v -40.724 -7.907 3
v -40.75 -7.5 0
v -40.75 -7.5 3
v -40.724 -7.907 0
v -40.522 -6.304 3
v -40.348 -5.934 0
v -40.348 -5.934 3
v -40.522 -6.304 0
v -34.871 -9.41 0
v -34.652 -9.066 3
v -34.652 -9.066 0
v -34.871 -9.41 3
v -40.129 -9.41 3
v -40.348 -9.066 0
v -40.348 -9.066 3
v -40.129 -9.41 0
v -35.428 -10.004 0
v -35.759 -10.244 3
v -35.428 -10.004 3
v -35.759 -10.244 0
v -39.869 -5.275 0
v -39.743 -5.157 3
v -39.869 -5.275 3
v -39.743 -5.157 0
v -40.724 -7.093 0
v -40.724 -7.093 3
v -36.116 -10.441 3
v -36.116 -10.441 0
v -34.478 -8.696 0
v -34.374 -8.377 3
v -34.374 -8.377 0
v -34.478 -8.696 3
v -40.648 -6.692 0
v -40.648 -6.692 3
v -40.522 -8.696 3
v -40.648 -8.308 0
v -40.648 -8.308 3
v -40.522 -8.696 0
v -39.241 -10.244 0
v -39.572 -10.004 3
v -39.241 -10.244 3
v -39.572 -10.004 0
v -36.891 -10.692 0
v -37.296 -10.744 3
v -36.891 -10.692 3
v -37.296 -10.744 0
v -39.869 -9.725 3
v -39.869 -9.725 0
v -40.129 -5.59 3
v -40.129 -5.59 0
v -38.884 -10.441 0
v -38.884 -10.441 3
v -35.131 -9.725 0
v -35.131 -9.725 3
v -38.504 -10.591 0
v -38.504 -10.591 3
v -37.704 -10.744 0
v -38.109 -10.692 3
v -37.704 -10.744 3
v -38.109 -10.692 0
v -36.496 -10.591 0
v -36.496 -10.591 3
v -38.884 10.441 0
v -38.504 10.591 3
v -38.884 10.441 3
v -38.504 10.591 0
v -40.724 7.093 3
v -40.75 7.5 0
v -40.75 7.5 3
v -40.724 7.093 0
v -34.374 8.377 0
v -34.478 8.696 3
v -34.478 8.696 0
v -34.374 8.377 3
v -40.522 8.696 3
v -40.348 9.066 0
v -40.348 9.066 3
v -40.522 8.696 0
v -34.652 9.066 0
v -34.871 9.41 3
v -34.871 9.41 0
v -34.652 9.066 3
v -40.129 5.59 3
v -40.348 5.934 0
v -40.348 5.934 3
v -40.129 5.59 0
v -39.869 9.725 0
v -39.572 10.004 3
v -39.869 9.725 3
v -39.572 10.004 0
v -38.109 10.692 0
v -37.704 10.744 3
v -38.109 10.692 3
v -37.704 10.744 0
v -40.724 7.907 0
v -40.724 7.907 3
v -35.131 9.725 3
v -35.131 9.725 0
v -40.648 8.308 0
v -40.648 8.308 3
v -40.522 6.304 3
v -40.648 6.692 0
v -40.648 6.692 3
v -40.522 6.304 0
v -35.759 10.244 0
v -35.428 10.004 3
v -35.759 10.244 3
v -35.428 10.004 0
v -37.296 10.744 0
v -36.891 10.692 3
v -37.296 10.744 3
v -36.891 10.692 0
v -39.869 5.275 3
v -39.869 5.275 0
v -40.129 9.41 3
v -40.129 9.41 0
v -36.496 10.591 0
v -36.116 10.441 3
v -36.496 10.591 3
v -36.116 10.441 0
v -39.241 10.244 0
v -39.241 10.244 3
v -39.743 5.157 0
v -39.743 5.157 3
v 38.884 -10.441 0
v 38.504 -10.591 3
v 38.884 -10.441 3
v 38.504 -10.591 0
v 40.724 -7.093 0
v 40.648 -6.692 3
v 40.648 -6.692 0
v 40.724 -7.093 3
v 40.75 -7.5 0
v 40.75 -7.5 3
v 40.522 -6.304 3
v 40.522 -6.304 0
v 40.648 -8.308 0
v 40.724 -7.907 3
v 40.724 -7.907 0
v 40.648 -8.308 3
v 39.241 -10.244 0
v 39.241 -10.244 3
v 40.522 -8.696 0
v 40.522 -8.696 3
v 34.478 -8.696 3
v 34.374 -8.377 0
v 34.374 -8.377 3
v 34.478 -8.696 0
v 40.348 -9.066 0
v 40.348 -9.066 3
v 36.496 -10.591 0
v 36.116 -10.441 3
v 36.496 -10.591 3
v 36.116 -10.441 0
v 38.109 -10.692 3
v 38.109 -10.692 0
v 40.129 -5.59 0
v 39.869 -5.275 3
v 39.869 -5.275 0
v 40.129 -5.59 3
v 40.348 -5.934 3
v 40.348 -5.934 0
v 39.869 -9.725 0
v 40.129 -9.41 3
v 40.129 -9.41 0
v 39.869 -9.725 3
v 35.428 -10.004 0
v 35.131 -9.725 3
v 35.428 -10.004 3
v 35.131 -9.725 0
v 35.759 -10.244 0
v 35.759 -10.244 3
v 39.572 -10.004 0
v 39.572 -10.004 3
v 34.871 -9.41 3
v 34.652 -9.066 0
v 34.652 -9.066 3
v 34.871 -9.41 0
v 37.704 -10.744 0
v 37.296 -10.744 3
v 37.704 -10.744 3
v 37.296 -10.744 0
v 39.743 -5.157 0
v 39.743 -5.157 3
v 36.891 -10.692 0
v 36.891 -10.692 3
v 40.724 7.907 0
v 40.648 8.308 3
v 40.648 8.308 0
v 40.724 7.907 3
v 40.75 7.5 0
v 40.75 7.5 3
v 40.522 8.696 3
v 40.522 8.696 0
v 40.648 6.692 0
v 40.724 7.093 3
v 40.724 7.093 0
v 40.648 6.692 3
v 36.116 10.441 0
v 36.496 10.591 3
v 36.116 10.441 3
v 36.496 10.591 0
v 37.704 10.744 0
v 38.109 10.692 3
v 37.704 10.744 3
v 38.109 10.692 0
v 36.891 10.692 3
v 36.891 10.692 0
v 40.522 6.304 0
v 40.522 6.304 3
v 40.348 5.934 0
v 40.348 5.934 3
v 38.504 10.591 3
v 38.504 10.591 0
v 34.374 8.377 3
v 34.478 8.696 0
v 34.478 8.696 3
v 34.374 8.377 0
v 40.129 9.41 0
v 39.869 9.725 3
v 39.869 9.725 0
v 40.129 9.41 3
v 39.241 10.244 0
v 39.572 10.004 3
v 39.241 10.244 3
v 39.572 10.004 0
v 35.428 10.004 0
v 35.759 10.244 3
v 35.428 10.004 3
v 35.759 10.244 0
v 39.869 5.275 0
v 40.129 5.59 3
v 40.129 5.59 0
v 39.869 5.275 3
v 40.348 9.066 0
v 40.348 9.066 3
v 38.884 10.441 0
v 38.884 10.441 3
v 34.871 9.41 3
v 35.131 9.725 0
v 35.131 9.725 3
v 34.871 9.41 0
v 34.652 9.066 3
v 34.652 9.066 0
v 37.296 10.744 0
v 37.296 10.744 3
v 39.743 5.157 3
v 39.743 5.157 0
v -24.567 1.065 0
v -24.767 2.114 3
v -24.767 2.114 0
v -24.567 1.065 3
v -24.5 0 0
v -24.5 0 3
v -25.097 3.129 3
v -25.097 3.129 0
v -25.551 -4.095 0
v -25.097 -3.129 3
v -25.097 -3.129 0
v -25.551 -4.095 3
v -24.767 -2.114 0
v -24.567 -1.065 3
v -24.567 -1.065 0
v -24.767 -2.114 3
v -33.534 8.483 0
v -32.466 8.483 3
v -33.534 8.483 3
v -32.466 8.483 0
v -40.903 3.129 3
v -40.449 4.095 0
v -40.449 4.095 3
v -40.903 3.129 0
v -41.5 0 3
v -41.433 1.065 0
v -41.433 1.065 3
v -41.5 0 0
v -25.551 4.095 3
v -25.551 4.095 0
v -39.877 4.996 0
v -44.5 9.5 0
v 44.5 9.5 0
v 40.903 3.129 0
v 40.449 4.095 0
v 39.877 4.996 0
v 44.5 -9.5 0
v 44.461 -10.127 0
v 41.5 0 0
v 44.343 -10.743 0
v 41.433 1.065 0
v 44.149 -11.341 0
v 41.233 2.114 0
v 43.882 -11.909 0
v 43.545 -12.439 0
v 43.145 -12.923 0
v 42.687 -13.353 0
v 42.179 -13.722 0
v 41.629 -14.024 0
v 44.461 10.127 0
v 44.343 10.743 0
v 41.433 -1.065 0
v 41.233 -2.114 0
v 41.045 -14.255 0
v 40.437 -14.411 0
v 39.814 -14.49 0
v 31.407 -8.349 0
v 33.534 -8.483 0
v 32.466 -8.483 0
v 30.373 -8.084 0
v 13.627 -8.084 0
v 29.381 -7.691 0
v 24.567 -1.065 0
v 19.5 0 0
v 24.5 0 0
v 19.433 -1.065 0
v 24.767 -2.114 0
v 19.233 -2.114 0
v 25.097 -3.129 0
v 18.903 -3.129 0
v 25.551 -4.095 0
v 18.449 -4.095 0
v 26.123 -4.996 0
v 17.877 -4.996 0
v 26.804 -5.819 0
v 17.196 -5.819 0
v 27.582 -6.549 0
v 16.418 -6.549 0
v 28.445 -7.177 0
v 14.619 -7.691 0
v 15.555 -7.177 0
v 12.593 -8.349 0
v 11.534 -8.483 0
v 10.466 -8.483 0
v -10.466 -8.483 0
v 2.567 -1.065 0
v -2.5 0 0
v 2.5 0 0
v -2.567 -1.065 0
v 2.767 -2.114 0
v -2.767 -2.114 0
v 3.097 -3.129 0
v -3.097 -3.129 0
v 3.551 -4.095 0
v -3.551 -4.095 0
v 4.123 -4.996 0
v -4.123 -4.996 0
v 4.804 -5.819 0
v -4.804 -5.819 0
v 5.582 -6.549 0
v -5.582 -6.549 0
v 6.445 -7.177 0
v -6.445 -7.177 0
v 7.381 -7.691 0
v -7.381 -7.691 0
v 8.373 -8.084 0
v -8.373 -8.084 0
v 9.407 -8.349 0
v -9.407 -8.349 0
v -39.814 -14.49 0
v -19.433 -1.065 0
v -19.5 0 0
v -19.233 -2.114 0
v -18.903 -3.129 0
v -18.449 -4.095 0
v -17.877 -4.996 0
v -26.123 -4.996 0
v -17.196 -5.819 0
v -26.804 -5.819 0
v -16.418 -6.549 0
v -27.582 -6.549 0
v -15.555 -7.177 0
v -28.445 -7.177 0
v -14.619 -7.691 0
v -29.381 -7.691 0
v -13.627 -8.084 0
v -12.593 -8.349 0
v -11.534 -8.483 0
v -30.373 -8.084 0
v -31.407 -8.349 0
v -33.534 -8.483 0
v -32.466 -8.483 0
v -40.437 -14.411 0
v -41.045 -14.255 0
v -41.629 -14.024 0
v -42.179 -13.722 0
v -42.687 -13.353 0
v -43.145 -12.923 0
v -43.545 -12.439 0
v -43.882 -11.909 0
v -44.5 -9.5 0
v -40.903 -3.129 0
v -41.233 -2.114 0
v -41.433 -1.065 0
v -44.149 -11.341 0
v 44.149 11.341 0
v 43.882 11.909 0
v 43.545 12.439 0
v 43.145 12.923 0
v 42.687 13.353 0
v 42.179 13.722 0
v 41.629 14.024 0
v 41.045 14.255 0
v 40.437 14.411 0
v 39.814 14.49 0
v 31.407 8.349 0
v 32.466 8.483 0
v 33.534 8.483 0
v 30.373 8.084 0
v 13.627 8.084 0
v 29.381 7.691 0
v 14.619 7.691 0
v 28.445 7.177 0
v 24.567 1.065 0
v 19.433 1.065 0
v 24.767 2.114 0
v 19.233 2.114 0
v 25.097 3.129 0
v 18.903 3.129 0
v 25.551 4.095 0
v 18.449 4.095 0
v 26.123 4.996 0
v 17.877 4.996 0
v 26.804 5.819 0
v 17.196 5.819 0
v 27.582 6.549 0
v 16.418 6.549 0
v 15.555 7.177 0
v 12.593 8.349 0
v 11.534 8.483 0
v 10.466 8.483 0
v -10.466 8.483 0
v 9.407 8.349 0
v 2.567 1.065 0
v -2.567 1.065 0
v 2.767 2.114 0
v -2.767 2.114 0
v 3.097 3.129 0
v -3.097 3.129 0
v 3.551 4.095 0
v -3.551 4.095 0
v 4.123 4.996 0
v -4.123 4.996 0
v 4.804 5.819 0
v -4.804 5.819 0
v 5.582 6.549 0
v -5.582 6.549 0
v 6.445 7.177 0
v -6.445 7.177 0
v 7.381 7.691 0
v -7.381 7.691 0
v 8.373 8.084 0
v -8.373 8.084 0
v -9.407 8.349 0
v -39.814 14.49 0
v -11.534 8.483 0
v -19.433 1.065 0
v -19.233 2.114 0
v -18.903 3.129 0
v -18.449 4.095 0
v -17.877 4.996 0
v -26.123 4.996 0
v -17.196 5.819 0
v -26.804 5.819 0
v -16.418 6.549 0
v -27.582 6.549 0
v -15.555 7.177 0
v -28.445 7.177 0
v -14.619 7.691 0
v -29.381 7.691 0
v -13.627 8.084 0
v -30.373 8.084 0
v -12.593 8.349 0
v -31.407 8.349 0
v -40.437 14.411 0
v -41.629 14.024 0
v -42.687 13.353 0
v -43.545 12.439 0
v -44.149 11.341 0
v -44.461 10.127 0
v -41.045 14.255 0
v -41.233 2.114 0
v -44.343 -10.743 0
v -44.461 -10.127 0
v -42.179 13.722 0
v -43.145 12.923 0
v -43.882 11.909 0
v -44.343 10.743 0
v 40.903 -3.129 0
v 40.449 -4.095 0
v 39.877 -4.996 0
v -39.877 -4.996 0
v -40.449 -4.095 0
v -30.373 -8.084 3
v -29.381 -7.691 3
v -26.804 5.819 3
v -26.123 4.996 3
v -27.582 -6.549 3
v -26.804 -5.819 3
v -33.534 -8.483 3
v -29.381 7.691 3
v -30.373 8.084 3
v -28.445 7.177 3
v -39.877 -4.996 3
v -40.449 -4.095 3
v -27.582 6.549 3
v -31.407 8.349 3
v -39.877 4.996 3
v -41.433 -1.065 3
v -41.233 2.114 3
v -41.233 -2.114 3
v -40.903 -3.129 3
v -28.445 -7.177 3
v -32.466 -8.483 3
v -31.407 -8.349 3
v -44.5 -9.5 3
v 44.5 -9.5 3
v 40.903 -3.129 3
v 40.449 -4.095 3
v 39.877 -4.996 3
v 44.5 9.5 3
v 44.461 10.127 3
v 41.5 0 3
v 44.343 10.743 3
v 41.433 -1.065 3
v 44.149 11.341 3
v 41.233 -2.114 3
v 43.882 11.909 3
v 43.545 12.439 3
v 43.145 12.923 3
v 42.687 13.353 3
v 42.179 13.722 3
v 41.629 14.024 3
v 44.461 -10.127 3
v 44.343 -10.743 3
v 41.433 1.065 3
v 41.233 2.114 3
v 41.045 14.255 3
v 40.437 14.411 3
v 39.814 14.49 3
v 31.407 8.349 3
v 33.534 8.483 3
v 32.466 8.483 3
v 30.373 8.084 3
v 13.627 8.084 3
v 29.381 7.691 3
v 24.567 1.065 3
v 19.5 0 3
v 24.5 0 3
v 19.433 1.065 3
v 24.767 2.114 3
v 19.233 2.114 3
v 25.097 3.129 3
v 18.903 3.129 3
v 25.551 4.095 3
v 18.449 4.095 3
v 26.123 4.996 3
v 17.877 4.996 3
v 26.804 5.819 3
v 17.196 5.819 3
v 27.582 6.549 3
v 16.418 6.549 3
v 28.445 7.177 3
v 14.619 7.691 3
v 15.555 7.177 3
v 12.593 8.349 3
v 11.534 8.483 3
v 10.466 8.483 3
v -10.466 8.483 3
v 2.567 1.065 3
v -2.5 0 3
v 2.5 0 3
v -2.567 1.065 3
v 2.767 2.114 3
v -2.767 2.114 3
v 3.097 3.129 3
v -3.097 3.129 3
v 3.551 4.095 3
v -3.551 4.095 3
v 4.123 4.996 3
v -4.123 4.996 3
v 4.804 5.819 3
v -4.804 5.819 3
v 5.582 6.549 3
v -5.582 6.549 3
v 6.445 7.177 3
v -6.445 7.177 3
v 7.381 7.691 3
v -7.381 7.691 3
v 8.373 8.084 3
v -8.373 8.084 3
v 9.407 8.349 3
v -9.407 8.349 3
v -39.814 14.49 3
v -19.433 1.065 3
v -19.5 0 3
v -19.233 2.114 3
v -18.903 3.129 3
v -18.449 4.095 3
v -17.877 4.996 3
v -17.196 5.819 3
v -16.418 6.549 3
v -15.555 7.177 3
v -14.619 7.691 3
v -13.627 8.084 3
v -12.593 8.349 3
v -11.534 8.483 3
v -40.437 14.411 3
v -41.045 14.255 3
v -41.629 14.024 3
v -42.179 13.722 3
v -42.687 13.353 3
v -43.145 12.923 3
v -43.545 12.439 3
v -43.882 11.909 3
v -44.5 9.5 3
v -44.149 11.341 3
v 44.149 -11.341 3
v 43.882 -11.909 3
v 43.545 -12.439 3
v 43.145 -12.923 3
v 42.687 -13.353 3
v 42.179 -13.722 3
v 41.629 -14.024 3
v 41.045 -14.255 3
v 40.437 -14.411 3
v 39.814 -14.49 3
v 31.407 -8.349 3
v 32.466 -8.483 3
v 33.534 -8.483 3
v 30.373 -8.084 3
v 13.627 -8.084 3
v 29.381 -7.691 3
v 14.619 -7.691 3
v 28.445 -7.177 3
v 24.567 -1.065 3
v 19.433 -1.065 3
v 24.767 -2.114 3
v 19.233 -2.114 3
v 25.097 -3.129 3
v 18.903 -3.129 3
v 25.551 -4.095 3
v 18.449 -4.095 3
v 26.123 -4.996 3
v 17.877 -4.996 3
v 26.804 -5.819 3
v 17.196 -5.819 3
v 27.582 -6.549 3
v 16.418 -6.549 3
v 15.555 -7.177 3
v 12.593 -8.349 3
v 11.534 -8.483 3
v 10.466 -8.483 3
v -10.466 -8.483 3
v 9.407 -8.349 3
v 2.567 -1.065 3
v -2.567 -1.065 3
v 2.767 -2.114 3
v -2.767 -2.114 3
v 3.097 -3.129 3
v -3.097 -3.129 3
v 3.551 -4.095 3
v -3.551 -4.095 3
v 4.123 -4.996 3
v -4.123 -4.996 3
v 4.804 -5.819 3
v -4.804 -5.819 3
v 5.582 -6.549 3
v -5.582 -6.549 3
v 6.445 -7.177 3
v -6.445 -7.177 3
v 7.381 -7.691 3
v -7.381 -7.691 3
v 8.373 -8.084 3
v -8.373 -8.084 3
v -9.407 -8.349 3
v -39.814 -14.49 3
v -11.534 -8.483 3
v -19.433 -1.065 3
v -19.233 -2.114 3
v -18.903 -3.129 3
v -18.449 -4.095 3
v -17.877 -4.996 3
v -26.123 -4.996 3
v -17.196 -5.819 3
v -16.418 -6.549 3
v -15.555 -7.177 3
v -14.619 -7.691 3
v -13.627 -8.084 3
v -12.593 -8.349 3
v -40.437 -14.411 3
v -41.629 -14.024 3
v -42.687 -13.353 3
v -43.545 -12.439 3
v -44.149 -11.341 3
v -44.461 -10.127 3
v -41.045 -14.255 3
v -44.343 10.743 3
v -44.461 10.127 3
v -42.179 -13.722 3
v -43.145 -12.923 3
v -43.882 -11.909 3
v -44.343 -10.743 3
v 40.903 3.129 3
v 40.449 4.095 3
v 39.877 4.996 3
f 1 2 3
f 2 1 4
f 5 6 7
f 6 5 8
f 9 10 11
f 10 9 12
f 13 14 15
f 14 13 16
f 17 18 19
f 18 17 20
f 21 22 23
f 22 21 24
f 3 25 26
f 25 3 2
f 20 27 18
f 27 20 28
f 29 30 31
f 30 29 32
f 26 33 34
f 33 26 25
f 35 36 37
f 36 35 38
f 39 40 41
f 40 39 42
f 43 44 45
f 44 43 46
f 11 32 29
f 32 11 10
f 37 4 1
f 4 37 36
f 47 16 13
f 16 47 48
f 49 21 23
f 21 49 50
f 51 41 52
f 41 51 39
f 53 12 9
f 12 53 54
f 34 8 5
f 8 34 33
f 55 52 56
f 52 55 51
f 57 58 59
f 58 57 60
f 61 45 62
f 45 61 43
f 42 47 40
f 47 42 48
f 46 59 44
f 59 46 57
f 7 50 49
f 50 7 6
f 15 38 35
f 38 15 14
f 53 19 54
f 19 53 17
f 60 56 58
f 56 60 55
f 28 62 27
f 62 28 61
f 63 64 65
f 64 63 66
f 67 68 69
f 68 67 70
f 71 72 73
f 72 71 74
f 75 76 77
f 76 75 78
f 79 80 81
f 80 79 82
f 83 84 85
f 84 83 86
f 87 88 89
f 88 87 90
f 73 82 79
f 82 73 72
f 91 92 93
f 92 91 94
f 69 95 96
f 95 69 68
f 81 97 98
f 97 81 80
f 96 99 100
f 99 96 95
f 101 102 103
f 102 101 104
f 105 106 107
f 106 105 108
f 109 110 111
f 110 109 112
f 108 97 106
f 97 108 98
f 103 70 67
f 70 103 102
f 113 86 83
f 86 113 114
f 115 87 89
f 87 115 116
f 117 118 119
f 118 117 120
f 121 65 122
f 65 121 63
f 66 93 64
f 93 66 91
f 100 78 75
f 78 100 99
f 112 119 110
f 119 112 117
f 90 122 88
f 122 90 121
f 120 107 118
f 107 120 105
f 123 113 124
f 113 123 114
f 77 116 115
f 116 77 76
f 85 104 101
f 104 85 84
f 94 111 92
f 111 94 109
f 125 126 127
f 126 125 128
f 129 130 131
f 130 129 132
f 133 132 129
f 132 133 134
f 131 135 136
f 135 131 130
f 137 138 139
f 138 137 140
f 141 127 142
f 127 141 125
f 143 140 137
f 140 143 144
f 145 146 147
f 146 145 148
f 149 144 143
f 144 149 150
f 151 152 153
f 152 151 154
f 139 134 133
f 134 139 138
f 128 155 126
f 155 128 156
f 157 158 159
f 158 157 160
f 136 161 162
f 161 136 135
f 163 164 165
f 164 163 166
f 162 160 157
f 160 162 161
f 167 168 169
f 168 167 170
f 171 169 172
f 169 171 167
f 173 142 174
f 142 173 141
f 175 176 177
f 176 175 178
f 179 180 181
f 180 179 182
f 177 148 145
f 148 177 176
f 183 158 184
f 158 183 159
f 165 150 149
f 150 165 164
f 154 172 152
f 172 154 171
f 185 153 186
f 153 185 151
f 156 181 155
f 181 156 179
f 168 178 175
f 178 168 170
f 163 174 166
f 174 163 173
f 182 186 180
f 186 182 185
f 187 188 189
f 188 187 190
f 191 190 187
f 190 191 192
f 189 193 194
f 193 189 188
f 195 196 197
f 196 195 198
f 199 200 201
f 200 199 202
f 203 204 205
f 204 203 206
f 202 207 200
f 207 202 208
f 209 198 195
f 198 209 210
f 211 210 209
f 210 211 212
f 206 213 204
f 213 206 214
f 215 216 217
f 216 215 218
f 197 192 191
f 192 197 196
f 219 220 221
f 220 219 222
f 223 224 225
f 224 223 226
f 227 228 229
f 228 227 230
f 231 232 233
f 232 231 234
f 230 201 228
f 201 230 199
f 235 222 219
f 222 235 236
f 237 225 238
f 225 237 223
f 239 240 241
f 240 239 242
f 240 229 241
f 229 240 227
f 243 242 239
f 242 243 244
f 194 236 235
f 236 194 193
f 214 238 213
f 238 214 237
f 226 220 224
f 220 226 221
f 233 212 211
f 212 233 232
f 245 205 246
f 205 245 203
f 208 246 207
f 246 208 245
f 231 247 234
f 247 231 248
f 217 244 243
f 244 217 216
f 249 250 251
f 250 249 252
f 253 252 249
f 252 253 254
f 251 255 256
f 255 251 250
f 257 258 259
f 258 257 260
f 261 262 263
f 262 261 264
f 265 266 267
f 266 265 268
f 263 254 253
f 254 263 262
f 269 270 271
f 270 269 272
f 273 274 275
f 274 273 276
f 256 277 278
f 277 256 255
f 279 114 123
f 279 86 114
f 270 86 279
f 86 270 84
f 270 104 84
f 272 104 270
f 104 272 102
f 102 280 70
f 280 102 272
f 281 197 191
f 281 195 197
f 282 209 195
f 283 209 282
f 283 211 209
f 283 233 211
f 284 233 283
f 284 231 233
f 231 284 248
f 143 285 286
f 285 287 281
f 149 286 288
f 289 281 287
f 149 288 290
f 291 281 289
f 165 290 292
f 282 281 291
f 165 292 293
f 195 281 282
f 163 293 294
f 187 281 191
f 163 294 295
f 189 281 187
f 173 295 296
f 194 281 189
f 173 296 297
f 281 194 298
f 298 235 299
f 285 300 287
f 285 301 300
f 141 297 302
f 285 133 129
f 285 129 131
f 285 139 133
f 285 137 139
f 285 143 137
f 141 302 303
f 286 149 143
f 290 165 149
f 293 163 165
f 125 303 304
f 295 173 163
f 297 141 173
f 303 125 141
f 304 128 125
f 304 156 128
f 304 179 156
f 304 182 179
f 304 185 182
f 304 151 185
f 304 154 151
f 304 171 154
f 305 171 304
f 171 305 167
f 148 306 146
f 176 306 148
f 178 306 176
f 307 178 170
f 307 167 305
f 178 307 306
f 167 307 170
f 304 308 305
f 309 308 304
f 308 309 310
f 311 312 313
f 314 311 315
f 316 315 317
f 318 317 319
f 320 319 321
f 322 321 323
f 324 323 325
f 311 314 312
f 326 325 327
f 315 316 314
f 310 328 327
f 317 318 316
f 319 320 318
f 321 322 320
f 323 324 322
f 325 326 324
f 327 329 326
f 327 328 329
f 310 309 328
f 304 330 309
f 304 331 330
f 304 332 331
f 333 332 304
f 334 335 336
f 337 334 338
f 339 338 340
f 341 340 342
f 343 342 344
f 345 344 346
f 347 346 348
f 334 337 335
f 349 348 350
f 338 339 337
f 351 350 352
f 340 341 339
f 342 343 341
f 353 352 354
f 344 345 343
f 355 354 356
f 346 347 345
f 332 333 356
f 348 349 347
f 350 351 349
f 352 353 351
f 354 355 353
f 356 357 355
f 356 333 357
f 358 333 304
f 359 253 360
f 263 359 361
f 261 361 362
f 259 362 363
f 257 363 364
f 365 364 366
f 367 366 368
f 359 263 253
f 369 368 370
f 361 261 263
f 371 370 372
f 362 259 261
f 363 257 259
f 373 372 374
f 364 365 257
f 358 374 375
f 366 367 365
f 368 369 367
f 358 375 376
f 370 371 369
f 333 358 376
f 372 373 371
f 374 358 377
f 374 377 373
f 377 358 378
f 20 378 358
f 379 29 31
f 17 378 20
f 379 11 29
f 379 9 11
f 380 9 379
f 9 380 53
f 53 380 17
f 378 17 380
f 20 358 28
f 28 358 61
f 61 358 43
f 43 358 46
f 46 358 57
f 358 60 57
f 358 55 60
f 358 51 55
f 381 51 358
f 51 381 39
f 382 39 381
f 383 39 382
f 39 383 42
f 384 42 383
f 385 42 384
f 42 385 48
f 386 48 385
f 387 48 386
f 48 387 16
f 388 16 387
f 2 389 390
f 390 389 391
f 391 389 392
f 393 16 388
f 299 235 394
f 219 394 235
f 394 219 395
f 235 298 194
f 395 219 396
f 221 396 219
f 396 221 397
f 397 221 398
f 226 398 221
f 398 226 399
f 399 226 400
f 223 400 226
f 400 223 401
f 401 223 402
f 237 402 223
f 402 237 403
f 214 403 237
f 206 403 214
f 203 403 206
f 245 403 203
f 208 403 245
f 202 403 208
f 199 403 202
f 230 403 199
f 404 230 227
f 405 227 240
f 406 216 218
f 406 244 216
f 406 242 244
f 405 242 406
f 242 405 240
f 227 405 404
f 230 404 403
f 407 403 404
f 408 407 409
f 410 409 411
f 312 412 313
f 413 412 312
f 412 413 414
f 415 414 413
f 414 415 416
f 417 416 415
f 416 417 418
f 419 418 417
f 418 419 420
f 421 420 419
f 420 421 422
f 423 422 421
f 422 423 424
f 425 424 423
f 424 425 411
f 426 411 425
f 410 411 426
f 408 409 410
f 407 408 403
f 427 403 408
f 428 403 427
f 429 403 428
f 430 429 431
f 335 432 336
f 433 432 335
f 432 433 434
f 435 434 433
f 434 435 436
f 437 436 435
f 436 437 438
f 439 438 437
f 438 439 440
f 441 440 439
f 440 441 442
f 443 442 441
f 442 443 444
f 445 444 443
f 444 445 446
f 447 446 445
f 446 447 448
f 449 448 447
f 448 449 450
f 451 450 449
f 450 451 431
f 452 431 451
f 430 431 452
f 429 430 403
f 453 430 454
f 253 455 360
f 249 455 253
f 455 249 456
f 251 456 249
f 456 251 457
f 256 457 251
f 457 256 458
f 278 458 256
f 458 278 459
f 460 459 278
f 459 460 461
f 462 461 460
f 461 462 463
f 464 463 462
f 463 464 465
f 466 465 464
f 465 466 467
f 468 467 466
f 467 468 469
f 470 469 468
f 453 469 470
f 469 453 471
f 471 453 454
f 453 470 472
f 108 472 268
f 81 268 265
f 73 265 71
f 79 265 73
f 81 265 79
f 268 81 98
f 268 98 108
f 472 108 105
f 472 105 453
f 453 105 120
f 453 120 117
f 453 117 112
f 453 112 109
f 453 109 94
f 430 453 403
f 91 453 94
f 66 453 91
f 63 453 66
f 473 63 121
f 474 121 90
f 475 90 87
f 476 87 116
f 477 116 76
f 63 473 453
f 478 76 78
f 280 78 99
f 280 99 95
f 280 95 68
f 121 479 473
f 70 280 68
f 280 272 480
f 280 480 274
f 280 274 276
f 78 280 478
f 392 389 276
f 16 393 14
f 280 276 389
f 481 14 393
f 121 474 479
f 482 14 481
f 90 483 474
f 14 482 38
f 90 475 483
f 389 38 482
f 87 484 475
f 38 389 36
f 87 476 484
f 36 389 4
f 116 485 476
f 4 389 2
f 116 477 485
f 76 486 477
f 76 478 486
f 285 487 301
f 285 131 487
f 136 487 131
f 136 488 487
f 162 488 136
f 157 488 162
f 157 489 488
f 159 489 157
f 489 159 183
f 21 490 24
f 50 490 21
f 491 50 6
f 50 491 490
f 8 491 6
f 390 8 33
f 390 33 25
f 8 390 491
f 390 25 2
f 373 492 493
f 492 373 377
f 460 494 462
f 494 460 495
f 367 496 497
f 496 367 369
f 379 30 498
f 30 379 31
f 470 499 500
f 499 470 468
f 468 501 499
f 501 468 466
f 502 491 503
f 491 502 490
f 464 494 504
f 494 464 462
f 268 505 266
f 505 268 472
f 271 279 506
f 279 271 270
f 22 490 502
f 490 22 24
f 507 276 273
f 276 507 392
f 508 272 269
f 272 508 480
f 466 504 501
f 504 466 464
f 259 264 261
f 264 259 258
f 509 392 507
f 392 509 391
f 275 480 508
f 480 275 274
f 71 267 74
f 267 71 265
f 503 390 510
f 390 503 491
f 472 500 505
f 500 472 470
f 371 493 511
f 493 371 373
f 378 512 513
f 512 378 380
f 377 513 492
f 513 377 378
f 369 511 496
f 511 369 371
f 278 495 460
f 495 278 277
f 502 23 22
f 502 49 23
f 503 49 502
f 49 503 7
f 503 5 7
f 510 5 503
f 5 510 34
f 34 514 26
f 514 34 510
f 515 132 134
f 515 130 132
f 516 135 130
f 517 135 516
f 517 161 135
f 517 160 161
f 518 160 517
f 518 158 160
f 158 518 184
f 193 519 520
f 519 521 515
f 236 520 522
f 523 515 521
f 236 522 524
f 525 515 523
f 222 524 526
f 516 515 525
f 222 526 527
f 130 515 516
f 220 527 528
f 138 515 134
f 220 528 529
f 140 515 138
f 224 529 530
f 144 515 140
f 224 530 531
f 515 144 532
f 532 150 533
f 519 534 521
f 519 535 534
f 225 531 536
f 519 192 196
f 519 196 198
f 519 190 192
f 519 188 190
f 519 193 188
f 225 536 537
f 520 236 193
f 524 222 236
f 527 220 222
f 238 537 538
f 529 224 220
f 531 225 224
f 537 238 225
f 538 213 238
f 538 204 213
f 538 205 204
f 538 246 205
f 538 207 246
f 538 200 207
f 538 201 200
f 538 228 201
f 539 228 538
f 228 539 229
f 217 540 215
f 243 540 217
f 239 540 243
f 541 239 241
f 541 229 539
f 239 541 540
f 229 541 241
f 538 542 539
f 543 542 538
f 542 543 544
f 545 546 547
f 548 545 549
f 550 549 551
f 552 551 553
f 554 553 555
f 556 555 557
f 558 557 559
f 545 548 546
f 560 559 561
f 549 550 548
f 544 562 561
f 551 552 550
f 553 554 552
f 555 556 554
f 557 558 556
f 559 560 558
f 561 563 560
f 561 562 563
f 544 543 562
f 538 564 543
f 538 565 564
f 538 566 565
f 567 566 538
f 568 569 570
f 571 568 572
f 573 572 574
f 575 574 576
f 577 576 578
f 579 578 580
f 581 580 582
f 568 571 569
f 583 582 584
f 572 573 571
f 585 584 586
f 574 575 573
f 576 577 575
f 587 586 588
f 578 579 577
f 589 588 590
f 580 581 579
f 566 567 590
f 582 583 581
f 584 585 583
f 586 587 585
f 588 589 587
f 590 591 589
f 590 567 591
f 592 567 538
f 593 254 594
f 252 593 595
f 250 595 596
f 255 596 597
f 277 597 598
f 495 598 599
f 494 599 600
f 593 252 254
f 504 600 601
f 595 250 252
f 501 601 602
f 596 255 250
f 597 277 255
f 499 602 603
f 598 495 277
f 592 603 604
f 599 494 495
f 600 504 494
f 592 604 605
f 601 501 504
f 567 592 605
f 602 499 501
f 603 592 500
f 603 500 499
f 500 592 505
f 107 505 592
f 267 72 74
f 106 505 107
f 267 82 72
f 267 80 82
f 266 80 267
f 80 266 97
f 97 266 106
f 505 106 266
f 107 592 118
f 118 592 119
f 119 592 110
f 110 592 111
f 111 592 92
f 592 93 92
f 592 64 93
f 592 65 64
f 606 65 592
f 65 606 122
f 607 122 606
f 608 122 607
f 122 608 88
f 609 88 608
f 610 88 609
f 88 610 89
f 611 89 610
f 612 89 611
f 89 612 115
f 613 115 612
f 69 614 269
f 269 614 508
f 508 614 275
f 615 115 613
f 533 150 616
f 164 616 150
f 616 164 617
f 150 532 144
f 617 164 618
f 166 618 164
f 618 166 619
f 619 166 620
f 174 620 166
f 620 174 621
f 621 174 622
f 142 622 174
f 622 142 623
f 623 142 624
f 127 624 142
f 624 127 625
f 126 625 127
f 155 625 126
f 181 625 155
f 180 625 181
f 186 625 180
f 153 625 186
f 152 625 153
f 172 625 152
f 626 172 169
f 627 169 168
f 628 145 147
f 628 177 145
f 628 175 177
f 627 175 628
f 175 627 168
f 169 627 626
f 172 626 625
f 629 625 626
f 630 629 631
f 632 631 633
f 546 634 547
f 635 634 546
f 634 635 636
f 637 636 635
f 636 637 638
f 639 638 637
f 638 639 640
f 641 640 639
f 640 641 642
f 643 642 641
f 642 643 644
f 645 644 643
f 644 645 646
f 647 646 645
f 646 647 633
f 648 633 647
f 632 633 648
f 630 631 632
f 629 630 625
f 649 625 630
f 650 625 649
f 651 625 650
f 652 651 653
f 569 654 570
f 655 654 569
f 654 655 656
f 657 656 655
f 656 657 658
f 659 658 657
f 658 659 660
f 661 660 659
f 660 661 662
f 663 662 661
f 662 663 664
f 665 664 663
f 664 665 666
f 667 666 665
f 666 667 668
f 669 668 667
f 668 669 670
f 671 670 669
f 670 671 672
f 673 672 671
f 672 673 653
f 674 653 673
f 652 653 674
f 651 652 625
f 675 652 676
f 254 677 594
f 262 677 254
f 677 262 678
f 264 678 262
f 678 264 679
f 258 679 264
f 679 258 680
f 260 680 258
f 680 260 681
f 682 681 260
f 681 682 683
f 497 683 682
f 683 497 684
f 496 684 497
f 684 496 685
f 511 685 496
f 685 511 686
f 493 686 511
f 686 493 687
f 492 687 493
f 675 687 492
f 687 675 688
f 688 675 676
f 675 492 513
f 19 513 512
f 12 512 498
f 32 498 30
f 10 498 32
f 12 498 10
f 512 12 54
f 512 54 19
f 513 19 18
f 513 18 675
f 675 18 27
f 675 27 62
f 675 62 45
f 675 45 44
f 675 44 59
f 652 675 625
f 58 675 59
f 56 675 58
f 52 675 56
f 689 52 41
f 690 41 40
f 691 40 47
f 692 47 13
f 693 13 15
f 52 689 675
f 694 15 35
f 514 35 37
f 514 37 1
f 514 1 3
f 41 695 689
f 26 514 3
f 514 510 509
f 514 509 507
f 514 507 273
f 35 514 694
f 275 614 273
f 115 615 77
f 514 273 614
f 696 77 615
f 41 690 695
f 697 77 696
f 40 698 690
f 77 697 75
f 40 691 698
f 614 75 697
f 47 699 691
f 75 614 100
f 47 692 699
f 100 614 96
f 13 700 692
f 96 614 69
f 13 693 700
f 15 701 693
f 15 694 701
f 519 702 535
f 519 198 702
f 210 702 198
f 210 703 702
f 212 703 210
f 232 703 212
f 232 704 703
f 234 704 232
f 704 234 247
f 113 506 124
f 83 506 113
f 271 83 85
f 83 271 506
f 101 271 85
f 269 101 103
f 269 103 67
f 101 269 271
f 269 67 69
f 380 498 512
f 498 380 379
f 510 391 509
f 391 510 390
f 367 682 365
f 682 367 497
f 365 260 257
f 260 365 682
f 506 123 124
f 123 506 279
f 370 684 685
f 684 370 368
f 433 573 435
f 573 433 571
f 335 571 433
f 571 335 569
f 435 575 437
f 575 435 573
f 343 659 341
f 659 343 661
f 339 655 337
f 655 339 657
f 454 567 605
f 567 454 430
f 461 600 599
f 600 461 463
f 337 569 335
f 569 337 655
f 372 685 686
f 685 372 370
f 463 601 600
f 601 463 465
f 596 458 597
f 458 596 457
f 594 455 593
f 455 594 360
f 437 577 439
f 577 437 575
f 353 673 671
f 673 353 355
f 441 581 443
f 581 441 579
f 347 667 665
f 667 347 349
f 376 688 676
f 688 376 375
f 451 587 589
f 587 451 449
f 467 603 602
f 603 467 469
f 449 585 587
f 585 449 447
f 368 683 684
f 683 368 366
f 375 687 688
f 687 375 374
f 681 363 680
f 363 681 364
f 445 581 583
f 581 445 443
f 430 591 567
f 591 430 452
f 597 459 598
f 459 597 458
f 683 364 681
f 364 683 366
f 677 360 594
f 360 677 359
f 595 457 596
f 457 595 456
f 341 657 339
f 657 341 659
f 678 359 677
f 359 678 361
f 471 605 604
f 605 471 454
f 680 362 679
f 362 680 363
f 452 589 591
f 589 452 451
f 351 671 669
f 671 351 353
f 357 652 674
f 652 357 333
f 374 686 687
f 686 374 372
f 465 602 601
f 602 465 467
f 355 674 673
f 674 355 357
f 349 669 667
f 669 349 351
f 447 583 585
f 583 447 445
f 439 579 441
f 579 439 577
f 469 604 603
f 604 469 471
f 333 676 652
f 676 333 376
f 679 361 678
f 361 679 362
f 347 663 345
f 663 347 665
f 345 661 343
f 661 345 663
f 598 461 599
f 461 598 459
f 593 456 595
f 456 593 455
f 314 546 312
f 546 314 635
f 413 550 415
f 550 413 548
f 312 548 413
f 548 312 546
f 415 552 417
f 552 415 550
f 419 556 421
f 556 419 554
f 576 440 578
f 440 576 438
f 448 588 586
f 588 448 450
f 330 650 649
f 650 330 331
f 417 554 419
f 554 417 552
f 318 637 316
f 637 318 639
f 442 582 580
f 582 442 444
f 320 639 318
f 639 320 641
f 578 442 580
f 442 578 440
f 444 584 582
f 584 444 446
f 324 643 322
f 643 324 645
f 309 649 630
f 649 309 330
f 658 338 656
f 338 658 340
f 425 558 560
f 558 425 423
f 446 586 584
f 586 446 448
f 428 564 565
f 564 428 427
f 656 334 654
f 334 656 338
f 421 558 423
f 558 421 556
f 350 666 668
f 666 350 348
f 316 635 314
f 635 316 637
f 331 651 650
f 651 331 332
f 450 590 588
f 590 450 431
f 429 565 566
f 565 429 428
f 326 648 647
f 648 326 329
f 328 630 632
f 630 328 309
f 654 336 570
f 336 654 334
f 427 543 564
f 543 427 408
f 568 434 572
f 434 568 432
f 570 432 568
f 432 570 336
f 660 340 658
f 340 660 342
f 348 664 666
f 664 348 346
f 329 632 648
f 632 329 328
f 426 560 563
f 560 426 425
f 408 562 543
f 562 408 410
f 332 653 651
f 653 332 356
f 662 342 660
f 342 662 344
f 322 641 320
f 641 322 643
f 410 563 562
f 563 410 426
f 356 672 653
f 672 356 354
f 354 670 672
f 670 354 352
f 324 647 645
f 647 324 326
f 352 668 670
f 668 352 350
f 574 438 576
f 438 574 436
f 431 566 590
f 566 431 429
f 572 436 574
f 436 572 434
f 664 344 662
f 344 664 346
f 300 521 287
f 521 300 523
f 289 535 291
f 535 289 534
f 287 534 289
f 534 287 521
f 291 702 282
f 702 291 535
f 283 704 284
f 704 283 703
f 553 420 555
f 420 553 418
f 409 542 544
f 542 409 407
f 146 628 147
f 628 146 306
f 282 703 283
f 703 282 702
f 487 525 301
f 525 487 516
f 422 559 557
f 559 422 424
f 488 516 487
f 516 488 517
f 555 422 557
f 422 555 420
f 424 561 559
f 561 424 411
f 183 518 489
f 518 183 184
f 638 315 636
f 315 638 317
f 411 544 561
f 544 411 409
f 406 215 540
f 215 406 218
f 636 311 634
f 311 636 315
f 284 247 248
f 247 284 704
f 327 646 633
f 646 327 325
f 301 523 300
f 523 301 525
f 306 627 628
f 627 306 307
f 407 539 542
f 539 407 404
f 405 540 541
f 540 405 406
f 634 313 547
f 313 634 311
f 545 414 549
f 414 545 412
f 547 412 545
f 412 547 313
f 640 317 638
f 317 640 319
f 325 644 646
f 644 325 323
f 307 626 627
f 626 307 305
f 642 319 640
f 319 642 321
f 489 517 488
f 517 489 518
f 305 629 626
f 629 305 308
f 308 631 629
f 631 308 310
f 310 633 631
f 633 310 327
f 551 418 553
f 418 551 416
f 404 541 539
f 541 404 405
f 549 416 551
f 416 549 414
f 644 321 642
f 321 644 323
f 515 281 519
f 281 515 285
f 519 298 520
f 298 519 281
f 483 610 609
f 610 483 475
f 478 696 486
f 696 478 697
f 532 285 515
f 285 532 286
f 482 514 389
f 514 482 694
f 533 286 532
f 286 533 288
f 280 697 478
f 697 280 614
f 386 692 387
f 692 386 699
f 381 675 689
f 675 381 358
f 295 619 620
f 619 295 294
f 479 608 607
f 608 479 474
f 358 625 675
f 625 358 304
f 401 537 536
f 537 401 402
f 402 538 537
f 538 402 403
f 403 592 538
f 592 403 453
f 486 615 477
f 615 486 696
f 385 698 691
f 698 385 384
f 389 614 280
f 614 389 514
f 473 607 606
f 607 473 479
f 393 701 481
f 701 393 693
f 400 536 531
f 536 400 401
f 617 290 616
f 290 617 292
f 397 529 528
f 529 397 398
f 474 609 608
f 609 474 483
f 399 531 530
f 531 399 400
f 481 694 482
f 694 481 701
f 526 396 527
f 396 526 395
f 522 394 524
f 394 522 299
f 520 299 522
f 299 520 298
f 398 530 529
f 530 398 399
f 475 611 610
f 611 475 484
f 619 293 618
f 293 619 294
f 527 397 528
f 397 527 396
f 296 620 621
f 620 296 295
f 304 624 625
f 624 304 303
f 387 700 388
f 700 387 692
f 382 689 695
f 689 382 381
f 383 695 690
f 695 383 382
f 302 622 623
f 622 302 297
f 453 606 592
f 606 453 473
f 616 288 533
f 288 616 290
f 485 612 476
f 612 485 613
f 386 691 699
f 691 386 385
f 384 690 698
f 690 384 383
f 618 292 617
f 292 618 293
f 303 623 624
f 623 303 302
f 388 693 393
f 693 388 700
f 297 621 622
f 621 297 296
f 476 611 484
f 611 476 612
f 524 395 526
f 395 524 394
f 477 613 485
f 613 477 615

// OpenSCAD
$fn = 50;


difference() {
	union() {
		hull() {
			translate(v = [-39.5000000000, 9.5000000000, 0]) {
				cylinder(h = 3, r = 5);
			}
			translate(v = [39.5000000000, 9.5000000000, 0]) {
				cylinder(h = 3, r = 5);
			}
			translate(v = [-39.5000000000, -9.5000000000, 0]) {
				cylinder(h = 3, r = 5);
			}
			translate(v = [39.5000000000, -9.5000000000, 0]) {
				cylinder(h = 3, r = 5);
			}
		}
	}
	union() {
		#translate(v = [-37.5000000000, -7.5000000000, -100.0000000000]) {
			cylinder(h = 200, r = 3.2500000000);
		}
		#translate(v = [-37.5000000000, 7.5000000000, -100.0000000000]) {
			cylinder(h = 200, r = 3.2500000000);
		}
		#translate(v = [37.5000000000, -7.5000000000, -100.0000000000]) {
			cylinder(h = 200, r = 3.2500000000);
		}
		#translate(v = [37.5000000000, 7.5000000000, -100.0000000000]) {
			cylinder(h = 200, r = 3.2500000000);
		}
		#translate(v = [-33.0000000000, 0, 0]) {
			cylinder(h = 3, r = 8.5000000000);
		}
		#translate(v = [-11.0000000000, 0, 0]) {
			cylinder(h = 3, r = 8.5000000000);
		}
		#translate(v = [11.0000000000, 0, 0]) {
			cylinder(h = 3, r = 8.5000000000);
		}
		#translate(v = [33.0000000000, 0, 0]) {
			cylinder(h = 3, r = 8.5000000000);
		}
	}
}
